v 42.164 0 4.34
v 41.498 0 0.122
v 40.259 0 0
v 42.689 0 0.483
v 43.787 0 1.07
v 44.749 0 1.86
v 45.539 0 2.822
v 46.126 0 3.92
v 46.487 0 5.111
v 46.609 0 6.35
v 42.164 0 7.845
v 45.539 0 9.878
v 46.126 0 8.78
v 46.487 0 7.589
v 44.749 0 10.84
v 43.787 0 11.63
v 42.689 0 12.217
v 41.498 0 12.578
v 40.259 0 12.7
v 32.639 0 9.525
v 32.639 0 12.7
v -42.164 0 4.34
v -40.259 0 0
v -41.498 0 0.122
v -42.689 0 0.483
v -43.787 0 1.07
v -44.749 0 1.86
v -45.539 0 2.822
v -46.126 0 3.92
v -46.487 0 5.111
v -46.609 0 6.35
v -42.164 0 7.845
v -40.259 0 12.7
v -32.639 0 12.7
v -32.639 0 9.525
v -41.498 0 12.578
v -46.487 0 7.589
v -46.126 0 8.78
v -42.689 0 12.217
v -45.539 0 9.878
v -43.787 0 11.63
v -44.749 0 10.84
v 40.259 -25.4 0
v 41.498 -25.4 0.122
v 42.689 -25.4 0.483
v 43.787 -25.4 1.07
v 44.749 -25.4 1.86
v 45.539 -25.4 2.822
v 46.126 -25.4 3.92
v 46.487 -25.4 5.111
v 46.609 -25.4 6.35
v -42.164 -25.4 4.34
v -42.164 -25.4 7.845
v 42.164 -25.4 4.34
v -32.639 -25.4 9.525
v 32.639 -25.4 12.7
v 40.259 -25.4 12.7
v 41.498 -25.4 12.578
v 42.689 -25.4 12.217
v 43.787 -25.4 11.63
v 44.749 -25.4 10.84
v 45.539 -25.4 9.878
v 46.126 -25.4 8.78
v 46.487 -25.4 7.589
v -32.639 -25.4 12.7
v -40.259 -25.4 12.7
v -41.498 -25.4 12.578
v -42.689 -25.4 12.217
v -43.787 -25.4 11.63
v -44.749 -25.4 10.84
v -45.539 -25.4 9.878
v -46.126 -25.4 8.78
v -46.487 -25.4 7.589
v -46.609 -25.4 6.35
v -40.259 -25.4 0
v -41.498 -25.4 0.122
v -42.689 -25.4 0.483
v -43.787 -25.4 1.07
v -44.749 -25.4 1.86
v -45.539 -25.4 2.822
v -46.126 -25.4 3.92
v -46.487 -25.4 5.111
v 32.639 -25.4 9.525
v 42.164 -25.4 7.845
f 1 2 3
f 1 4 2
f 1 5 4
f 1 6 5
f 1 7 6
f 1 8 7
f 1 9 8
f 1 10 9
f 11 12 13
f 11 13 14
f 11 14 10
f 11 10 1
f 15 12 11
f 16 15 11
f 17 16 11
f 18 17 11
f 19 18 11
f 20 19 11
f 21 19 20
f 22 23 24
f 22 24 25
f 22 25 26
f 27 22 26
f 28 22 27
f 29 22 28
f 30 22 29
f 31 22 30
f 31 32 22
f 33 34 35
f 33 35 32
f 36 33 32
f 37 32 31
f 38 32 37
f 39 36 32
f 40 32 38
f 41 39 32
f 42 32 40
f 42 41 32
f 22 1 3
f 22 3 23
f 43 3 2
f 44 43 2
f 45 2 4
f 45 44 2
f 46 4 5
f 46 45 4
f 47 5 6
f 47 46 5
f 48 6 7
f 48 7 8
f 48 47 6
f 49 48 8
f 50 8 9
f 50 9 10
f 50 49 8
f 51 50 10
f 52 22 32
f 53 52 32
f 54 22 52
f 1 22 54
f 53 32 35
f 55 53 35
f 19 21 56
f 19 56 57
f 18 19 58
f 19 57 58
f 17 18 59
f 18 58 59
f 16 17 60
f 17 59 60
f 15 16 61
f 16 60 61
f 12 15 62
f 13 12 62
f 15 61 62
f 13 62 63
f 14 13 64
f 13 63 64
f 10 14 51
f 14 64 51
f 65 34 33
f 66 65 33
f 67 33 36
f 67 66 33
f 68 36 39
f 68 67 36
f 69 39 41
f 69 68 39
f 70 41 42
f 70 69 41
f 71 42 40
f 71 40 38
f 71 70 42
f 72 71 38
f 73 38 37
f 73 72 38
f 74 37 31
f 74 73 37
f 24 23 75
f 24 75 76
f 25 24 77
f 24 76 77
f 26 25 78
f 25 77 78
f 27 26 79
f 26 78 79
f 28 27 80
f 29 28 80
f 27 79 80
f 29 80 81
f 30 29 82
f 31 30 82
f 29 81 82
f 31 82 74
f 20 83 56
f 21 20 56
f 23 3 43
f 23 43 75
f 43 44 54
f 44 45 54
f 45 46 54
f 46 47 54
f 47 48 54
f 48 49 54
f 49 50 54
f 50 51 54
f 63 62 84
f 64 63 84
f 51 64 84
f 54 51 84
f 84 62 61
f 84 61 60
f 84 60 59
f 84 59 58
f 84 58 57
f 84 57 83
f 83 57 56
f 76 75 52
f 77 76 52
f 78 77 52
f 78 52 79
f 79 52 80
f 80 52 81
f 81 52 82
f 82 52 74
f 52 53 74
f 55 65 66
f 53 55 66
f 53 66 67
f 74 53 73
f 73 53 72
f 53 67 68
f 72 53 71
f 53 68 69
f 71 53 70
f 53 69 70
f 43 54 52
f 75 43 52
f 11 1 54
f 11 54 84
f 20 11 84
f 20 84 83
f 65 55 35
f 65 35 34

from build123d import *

# Parameters (mm, degrees)
F1_DEPTH = 25.4
F2_R     = 6.34999


# Not quite as in the source:
# - a fillet or chamfer is up to 0.001 mm smaller than in the source, because OpenCascade refuses the exact size


with BuildPart() as f1:
    # F0 (on Front) → F1 (new body)
    with BuildSketch(Plane.XZ):
        Polygon((-46.609, 0), (0, 0), (0, 4.3402855088), (-42.164, 4.3402855088), (-42.164, 7.8454855088), (-32.639, 9.525), (-32.639, 12.7), (-46.609, 12.7), align=None)
    extrude(amount=F1_DEPTH)

    # F2 (radius 6.35 in the source; OpenCascade refuses exactly that, so slightly less here)
    f2_edges = [f1.edges().sort_by_distance(p)[0] for p in [
        (-46.609, -12.7, 12.7),
        (-46.609, -12.7, 0),
    ]]
    fillet(f2_edges, radius=F2_R)

    # F3: F1 across face


with BuildPart() as f1_1:
    add(f1.part)
    add(f1.part.mirror(Plane(origin=(0, -12.7, 2.1701427544), x_dir=(0, 1, 0), z_dir=(1, 0, 0))))


solid = f1_1.part
